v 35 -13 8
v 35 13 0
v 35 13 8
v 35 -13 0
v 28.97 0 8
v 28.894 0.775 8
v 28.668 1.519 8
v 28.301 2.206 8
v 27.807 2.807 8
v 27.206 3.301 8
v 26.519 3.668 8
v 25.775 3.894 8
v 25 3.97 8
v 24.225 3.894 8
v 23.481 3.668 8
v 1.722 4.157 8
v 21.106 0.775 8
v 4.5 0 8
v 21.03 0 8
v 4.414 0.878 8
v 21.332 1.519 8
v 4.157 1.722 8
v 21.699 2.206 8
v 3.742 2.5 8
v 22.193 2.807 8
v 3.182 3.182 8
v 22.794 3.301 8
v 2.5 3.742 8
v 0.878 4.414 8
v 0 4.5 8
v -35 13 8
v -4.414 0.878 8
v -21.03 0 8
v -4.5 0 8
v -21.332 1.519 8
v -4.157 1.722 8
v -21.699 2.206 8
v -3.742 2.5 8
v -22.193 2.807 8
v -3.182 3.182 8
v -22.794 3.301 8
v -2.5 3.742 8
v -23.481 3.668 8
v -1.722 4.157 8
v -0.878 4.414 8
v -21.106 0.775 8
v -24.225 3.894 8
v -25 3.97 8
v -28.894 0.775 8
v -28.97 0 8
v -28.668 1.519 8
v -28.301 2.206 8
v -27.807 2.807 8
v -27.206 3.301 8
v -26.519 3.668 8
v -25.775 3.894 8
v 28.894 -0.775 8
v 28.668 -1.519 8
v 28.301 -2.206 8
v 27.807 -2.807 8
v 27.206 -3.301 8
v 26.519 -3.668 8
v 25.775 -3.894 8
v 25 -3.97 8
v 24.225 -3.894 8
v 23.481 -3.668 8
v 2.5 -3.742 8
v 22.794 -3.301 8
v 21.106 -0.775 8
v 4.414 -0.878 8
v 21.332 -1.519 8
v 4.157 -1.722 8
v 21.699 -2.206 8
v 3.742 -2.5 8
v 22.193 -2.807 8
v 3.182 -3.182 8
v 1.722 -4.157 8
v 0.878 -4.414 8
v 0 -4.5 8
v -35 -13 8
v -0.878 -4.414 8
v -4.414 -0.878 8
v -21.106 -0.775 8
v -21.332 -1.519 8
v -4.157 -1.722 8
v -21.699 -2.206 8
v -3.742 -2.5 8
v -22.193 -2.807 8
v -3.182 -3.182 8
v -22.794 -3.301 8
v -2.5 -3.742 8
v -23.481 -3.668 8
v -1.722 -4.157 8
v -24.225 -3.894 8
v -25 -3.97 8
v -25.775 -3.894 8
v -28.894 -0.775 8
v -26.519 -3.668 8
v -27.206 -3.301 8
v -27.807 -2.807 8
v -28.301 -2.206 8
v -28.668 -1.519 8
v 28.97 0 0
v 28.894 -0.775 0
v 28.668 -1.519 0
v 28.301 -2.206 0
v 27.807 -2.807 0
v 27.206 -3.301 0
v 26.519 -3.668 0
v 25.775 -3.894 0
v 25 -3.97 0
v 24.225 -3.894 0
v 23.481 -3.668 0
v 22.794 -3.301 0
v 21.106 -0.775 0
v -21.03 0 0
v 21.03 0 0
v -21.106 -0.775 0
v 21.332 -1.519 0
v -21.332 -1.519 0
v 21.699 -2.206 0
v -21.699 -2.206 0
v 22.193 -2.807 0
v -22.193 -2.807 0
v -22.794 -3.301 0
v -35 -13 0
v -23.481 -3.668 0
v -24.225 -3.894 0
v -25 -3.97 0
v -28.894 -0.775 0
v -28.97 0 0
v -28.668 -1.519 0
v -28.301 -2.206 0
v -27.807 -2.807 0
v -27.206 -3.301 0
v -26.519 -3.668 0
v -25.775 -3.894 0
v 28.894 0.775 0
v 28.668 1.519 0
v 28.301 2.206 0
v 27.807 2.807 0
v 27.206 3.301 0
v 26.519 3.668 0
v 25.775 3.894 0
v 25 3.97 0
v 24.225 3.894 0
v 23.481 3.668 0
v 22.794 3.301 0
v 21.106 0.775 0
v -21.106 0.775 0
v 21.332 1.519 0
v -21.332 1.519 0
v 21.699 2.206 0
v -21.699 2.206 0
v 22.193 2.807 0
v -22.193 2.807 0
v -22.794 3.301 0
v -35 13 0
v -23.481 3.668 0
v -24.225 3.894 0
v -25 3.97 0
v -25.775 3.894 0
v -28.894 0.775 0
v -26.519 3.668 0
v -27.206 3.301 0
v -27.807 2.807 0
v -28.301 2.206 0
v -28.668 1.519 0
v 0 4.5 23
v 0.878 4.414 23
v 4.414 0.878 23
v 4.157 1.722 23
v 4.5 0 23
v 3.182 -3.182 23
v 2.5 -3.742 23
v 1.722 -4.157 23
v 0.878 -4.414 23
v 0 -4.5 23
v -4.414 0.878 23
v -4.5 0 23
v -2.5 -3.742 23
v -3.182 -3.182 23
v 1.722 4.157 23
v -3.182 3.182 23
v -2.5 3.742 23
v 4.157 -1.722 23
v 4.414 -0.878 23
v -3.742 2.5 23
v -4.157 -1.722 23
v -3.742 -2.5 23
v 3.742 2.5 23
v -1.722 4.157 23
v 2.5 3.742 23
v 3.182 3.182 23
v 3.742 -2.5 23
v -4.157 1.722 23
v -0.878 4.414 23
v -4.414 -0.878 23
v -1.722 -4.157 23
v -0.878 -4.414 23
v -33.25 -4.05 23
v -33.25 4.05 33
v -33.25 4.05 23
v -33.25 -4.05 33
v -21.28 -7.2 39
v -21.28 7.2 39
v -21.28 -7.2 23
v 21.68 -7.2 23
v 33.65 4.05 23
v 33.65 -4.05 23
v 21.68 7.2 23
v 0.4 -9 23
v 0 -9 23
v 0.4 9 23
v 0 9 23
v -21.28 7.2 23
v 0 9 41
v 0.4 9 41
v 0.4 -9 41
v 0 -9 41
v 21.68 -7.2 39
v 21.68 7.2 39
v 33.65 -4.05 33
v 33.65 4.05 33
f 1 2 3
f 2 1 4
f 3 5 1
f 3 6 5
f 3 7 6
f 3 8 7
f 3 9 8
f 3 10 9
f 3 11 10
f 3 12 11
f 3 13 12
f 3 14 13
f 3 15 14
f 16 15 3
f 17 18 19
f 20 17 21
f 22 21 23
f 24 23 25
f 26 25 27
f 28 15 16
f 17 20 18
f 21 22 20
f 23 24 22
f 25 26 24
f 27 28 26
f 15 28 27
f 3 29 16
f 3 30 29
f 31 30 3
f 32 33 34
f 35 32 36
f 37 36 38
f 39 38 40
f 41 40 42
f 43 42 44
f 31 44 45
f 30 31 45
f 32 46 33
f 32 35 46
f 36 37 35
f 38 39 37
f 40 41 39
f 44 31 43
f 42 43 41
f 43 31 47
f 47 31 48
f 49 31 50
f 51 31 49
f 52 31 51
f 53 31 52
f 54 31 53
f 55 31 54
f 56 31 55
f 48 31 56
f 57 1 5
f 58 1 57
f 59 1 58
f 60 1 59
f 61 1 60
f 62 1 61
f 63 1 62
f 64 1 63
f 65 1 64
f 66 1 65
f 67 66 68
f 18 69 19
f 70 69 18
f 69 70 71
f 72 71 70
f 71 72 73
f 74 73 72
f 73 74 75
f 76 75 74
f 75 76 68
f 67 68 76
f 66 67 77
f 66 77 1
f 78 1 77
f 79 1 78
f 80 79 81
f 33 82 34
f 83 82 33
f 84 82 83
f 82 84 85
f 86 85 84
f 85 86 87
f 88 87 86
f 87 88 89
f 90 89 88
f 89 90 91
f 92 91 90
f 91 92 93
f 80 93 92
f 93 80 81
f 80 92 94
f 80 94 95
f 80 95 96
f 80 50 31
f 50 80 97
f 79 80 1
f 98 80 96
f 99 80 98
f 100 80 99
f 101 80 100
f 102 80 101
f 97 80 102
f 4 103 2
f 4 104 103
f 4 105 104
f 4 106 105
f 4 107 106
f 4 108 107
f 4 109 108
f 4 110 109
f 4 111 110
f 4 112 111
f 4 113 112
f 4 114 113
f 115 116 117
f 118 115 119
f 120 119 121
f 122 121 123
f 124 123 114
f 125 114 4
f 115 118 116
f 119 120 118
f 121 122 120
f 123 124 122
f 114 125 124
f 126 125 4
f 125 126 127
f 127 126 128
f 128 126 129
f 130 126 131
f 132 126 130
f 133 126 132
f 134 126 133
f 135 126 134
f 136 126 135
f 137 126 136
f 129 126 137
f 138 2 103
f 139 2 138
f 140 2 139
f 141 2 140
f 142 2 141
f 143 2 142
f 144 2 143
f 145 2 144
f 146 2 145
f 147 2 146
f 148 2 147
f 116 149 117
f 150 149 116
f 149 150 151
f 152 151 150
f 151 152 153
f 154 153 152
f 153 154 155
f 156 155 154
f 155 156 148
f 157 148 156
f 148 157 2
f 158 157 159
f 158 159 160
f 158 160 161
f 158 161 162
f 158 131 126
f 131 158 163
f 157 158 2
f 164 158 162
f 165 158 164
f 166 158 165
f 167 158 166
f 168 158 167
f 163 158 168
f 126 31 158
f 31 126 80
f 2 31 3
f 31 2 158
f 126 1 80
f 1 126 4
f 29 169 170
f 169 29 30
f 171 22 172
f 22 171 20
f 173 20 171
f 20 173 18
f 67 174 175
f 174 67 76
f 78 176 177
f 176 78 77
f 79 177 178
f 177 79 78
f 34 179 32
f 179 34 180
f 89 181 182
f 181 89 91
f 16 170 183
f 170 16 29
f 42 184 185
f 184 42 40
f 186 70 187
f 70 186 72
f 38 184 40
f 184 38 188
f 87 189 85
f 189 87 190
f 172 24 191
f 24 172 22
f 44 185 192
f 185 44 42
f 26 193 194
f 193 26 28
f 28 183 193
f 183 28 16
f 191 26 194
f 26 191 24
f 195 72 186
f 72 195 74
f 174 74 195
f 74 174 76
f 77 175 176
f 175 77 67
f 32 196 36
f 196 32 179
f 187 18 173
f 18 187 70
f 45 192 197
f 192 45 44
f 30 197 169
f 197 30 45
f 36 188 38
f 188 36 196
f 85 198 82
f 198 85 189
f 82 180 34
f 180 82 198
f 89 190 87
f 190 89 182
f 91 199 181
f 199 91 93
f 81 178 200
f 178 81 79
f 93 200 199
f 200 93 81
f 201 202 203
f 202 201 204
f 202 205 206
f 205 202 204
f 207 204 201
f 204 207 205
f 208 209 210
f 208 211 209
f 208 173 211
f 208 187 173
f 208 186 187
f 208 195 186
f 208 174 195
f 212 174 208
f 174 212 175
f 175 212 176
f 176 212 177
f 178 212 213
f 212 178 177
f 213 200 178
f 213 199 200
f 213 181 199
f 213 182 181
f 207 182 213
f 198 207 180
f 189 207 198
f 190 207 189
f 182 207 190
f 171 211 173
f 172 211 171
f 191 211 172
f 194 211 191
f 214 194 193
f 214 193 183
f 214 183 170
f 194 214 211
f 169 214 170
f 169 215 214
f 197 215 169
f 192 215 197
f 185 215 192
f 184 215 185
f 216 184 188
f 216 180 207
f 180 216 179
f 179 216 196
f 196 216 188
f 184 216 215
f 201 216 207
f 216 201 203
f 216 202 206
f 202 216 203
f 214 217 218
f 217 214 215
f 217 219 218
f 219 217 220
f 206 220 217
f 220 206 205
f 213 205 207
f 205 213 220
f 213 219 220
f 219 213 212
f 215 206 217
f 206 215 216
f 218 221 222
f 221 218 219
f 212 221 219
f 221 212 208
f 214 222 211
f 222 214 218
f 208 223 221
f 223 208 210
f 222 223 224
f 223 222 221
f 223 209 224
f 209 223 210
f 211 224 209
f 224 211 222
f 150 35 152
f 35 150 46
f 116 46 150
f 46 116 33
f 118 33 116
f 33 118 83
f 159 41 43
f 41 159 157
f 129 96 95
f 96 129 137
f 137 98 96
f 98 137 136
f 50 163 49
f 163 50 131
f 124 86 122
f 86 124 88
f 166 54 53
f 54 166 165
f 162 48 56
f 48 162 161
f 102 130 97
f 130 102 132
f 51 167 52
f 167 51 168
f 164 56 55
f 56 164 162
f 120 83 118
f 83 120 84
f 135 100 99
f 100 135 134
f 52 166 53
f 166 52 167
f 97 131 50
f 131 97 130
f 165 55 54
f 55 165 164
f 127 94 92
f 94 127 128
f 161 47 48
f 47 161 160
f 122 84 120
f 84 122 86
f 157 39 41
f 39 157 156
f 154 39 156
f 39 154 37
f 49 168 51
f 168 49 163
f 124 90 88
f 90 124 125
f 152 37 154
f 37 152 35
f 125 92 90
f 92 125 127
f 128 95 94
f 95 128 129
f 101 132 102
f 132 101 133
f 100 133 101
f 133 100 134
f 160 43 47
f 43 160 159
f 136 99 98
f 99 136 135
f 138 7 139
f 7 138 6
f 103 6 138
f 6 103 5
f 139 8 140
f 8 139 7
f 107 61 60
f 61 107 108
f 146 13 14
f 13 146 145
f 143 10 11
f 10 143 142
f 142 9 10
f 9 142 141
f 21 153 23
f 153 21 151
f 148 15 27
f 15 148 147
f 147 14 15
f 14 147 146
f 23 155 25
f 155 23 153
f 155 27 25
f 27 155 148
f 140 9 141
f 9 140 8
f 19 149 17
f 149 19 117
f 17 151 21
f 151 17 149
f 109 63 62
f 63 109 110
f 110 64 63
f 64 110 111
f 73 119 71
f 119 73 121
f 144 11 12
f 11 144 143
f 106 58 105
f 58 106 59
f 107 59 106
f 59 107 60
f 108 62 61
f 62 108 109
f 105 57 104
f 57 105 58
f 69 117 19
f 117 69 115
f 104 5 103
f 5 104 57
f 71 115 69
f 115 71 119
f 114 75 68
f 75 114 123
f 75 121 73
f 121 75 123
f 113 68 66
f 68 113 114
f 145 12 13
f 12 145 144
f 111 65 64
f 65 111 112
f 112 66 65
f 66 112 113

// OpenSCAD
$fn = 32;

// ----------------------------------------------------------------------
// Boat cleat: 70 mm base, horn 32 mm up
// ----------------------------------------------------------------------

// --- parameters (mm) ---
base_l = 70;              // base length
base_w = 26;              // base width
base_t = 8;               // base thickness
horn_len = 66.5;          // horn length
horn_d = 18;              // horn diameter at the middle
horn_z = 32;              // horn axis height
end_drop = 8;             // how far the horn tips drop
post_d = 9;               // centre post diameter
holes_d = 7.94;           // fixing holes
hole_x = 25;              // fixing hole spacing

difference() {
  union() {
    translate([-35, -13, 0]) cube([base_l, base_w, base_t]);
    /* centre post, sunk 1 mm into the base */
    translate([0, 0, 7]) cylinder(h = 25, d = post_d);
    /* horn: a hull chain of boxes, full in the middle and lighter at the tips */
    hull() {
      translate([-33.25, -4.05, 23]) cube([0.4, 8.1, 10], center = false);
      translate([-21.28, -7.2, 23]) cube([0.4, 14.4, 16], center = false);
    }
    hull() {
      translate([-21.28, -7.2, 23]) cube([0.4, 14.4, 16], center = false);
      translate([0, -9, 23]) cube([0.4, 18, 18], center = false);
    }
    hull() {
      translate([0, -9, 23]) cube([0.4, 18, 18], center = false);
      translate([21.28, -7.2, 23]) cube([0.4, 14.4, 16], center = false);
    }
    hull() {
      translate([21.28, -7.2, 23]) cube([0.4, 14.4, 16], center = false);
      translate([33.25, -4.05, 23]) cube([0.4, 8.1, 10], center = false);
    }
  }
  translate([-25, 0, -2.5]) cylinder(h = base_t + 5, d = holes_d);
  translate([25, 0, -2.5]) cylinder(h = base_t + 5, d = holes_d);
}
